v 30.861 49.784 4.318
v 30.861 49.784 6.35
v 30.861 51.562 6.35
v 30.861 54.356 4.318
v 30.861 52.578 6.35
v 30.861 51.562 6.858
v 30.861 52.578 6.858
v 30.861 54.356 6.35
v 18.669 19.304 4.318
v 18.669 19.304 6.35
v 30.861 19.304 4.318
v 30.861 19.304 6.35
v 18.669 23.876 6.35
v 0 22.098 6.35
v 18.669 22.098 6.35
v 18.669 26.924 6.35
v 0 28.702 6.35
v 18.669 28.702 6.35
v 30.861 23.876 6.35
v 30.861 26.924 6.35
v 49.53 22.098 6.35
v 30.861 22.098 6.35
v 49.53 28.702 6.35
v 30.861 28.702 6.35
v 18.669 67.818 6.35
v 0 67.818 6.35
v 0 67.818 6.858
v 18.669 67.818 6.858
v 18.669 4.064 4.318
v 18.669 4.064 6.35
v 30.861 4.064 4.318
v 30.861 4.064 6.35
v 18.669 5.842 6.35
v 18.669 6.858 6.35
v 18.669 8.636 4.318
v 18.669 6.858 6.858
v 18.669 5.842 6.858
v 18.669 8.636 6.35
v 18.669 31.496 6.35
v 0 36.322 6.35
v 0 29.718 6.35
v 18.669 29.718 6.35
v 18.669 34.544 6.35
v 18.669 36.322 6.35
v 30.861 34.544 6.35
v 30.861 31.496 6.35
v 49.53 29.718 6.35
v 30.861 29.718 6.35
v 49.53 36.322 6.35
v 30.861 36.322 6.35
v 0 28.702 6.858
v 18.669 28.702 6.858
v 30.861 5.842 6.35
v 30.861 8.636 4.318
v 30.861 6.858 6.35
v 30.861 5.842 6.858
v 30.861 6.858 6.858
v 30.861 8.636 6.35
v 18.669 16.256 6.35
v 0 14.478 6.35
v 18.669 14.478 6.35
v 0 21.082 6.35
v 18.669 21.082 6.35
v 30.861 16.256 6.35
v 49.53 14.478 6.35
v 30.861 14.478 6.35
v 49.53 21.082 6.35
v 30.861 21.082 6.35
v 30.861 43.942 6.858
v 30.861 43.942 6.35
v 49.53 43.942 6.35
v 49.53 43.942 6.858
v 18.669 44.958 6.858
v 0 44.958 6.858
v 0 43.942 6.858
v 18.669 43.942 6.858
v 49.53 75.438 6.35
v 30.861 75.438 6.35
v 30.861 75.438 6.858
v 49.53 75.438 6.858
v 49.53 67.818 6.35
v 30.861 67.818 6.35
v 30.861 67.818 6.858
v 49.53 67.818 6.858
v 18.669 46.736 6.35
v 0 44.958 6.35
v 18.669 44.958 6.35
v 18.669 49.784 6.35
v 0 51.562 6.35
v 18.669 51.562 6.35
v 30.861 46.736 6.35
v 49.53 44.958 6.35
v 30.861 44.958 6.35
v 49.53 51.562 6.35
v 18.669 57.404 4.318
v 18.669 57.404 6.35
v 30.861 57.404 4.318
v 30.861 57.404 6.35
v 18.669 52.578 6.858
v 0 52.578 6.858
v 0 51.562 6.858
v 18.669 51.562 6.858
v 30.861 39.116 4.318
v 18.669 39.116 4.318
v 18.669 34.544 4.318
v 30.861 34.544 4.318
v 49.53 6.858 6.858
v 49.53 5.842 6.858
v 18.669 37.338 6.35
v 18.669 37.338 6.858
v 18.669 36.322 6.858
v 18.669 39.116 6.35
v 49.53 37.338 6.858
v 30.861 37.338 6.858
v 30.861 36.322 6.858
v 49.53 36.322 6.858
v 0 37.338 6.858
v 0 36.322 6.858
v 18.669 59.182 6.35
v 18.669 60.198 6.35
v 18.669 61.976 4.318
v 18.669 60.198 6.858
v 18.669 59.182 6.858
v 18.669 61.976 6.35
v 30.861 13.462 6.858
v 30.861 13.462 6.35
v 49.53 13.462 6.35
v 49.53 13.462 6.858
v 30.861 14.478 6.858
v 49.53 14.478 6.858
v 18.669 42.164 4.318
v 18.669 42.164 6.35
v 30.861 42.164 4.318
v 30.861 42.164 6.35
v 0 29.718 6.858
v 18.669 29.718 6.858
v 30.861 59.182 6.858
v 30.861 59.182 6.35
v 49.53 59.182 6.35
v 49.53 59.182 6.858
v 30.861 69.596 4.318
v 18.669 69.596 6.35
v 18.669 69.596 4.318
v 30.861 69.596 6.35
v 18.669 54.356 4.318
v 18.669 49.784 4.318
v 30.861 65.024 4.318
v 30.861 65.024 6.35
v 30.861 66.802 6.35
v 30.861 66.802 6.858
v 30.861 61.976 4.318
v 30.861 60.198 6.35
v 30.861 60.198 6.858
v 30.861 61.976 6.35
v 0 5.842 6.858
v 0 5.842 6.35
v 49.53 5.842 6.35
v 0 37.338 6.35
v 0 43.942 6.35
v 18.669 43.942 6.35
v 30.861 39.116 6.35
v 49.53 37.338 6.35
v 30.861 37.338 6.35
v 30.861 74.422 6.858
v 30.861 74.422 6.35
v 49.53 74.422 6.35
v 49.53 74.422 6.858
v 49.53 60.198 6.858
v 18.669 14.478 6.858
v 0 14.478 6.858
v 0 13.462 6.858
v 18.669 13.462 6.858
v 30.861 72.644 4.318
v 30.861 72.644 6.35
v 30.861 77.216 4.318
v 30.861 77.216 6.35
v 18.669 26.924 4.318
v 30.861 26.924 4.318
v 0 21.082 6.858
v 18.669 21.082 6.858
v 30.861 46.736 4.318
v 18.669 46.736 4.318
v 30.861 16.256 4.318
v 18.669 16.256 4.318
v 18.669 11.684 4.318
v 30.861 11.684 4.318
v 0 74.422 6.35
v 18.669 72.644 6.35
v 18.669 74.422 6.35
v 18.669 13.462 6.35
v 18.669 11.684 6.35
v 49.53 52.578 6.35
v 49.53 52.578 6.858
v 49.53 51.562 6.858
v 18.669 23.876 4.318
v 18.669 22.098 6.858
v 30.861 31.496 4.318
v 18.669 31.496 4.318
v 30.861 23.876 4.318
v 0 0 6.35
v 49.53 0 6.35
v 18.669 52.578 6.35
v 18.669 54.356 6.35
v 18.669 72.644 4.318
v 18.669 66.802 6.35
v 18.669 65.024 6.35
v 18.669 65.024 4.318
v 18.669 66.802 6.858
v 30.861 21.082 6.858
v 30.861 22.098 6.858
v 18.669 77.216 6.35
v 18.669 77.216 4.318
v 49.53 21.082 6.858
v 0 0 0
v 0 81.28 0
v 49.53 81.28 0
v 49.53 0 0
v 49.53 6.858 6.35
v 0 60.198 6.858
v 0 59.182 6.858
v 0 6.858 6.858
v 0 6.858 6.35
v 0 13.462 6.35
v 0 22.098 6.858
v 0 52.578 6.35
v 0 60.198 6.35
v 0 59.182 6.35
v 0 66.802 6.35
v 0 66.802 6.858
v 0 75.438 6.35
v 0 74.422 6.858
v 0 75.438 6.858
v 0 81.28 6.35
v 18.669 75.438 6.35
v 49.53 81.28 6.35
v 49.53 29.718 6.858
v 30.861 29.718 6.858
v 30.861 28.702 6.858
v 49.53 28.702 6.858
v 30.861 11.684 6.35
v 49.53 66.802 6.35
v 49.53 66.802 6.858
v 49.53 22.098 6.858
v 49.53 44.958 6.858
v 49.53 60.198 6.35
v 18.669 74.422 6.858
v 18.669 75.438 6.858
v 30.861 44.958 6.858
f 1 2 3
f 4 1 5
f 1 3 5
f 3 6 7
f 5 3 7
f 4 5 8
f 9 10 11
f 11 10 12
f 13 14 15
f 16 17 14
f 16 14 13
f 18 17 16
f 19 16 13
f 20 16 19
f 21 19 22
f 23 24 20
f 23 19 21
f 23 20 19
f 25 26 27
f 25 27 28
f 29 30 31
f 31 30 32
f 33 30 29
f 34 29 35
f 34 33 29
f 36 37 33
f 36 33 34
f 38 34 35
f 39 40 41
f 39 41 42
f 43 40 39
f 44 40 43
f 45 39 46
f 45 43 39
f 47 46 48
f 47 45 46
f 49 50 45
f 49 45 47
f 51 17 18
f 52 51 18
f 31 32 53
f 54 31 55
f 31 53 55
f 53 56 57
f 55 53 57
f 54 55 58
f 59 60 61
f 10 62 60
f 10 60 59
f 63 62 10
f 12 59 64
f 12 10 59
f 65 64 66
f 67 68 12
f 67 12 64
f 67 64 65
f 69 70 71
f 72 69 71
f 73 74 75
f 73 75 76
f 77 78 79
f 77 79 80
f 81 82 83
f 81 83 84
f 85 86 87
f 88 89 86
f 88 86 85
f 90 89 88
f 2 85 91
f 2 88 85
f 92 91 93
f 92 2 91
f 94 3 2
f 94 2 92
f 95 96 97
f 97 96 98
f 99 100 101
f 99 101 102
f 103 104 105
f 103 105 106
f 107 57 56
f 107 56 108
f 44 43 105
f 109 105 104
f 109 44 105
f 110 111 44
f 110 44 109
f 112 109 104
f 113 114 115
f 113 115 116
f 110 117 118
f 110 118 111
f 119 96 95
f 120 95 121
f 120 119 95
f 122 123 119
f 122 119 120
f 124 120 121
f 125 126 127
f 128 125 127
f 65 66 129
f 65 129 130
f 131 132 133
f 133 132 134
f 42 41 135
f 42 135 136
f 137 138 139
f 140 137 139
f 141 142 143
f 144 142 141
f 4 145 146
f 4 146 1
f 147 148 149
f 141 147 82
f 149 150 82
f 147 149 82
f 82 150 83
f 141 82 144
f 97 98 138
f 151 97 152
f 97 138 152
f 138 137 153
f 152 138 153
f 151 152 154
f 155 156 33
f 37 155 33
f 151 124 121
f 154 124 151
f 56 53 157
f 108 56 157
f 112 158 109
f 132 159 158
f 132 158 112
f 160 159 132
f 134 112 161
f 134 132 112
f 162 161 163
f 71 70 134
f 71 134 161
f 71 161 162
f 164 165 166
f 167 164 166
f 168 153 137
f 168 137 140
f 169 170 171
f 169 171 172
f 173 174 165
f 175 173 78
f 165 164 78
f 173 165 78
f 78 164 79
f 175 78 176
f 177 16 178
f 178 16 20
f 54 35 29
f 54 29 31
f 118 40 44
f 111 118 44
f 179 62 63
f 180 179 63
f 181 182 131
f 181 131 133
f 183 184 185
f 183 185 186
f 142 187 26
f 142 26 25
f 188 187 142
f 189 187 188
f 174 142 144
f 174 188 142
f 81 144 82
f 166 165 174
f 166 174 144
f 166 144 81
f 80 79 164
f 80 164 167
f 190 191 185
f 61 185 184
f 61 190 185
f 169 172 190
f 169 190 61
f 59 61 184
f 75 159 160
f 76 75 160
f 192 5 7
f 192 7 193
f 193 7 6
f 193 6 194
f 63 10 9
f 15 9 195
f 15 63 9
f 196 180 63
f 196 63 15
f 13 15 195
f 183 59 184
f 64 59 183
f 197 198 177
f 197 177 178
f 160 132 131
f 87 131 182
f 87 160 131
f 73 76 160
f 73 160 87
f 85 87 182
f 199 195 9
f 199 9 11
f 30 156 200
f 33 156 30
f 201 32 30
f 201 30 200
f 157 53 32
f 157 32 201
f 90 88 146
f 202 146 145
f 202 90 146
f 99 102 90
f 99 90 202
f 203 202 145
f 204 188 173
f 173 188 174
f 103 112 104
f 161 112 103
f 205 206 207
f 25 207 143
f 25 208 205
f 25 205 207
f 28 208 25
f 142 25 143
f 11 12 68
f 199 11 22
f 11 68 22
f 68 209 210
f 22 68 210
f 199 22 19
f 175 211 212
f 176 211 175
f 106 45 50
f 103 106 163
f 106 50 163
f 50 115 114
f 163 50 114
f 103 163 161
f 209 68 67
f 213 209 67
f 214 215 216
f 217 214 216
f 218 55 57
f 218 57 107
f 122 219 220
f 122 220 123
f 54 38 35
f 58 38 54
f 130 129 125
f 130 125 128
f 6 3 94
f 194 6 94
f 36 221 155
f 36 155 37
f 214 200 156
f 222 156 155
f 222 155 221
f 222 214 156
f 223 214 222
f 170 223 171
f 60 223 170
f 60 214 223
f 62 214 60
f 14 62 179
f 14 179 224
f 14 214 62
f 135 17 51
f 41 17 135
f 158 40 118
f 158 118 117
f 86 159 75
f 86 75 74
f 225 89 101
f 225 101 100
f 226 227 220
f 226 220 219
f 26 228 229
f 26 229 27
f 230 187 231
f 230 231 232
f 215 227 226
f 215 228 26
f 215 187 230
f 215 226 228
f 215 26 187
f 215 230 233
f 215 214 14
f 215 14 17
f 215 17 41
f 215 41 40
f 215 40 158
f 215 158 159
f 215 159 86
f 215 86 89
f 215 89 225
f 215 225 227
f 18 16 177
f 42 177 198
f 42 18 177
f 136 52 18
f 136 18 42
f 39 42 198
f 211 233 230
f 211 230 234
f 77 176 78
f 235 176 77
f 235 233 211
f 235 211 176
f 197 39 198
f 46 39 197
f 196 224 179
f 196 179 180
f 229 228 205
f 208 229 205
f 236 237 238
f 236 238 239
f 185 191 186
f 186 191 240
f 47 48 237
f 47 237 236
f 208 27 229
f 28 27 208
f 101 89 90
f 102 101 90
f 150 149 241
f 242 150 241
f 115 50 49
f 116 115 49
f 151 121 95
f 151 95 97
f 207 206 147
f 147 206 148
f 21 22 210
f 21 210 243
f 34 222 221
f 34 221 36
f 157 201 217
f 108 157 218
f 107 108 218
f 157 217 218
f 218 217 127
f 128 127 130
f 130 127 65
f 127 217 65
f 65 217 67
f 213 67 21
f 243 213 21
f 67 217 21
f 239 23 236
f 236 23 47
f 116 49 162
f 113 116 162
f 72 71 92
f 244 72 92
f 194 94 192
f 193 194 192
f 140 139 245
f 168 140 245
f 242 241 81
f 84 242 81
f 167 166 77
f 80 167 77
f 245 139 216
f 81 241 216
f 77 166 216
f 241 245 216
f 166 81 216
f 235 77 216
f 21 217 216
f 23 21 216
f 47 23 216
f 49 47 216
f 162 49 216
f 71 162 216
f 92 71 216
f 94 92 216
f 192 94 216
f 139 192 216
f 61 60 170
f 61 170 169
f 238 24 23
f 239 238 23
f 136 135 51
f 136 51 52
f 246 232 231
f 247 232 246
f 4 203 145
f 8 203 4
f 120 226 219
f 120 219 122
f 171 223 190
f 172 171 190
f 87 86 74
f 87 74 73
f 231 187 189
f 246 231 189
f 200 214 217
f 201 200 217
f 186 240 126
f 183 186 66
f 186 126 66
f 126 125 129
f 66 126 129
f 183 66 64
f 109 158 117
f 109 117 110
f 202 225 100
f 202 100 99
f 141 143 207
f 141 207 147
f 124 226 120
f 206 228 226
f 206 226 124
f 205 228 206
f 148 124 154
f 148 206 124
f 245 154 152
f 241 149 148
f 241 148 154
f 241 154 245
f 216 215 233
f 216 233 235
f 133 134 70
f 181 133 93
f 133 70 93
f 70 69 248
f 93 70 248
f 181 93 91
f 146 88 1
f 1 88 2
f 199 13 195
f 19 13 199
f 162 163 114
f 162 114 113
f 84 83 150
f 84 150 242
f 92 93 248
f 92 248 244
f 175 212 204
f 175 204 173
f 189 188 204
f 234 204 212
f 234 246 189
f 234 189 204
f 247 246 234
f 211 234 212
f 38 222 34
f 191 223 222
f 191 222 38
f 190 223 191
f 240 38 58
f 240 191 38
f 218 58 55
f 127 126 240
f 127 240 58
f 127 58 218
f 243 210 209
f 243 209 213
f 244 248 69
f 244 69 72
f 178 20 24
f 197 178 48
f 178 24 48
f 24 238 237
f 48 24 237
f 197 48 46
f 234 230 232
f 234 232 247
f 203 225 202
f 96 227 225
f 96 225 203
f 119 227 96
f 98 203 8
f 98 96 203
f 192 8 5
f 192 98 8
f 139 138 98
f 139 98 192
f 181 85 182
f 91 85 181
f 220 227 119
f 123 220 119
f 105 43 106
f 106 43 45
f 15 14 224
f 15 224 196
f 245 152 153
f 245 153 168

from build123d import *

# Parameters (mm, degrees)
F0_W     = 49.53
F0_H     = 81.28
F1_DEPTH = 6.35
F2_W     = 12.192
F2_H     = 4.572
F3_DEPTH = 2.032
F4_W     = 18.669
F4_H     = 1.016
F5_DEPTH = 0.508


with BuildPart() as f1:
    # F0 (on Top) → F1 (new body)
    with BuildSketch(Plane.XY):
        with Locations((24.765, 40.64)):
            Rectangle(F0_W, F0_H)
    extrude(amount=F1_DEPTH)

    # F2 (on face) → F3 (cut)
    with BuildSketch(Plane.XY.offset(6.35)):
        with Locations((24.765, 6.35)):
            Rectangle(F2_W, F2_H)
        with Locations((24.765, 13.97)):
            Rectangle(F2_W, F2_H)
        with Locations((24.765, 21.59)):
            Rectangle(F2_W, F2_H)
        with Locations((24.765, 29.21)):
            Rectangle(F2_W, F2_H)
        with Locations((24.765, 36.83)):
            Rectangle(F2_W, F2_H)
        with Locations((24.765, 44.45)):
            Rectangle(F2_W, F2_H)
        with Locations((24.765, 52.07)):
            Rectangle(F2_W, F2_H)
        with Locations((24.765, 59.69)):
            Rectangle(F2_W, F2_H)
        with Locations((24.765, 67.31)):
            Rectangle(F2_W, F2_H)
        with Locations((24.765, 74.93)):
            Rectangle(F2_W, F2_H)
    extrude(amount=-F3_DEPTH, mode=Mode.SUBTRACT)

    # F4 (on face) → F5 (join)
    with BuildSketch(Plane.XY.offset(6.35)):
        with Locations((40.1955, 6.35)):
            Rectangle(F4_W, F4_H)
        with Locations((9.3345, 6.35)):
            Rectangle(F4_W, F4_H)
        with Locations((9.3345, 13.97)):
            Rectangle(F4_W, F4_H)
        with Locations((40.1955, 13.97)):
            Rectangle(F4_W, F4_H)
        with Locations((9.3345, 21.59)):
            Rectangle(F4_W, F4_H)
        with Locations((40.1955, 21.59)):
            Rectangle(F4_W, F4_H)
        with Locations((9.3345, 29.21)):
            Rectangle(F4_W, F4_H)
        with Locations((40.1955, 29.21)):
            Rectangle(F4_W, F4_H)
        with Locations((9.3345, 36.83)):
            Rectangle(F4_W, F4_H)
        with Locations((40.1955, 36.83)):
            Rectangle(F4_W, F4_H)
        with Locations((9.3345, 44.45)):
            Rectangle(F4_W, F4_H)
        with Locations((40.1955, 44.45)):
            Rectangle(F4_W, F4_H)
        with Locations((9.3345, 52.07)):
            Rectangle(F4_W, F4_H)
        with Locations((40.1955, 52.07)):
            Rectangle(F4_W, F4_H)
        with Locations((9.3345, 59.69)):
            Rectangle(F4_W, F4_H)
        with Locations((40.1955, 59.69)):
            Rectangle(F4_W, F4_H)
        with Locations((9.3345, 67.31)):
            Rectangle(F4_W, F4_H)
        with Locations((40.1955, 67.31)):
            Rectangle(F4_W, F4_H)
        with Locations((9.3345, 74.93)):
            Rectangle(F4_W, F4_H)
        with Locations((40.1955, 74.93)):
            Rectangle(F4_W, F4_H)
    extrude(amount=F5_DEPTH)


solid = f1.part
